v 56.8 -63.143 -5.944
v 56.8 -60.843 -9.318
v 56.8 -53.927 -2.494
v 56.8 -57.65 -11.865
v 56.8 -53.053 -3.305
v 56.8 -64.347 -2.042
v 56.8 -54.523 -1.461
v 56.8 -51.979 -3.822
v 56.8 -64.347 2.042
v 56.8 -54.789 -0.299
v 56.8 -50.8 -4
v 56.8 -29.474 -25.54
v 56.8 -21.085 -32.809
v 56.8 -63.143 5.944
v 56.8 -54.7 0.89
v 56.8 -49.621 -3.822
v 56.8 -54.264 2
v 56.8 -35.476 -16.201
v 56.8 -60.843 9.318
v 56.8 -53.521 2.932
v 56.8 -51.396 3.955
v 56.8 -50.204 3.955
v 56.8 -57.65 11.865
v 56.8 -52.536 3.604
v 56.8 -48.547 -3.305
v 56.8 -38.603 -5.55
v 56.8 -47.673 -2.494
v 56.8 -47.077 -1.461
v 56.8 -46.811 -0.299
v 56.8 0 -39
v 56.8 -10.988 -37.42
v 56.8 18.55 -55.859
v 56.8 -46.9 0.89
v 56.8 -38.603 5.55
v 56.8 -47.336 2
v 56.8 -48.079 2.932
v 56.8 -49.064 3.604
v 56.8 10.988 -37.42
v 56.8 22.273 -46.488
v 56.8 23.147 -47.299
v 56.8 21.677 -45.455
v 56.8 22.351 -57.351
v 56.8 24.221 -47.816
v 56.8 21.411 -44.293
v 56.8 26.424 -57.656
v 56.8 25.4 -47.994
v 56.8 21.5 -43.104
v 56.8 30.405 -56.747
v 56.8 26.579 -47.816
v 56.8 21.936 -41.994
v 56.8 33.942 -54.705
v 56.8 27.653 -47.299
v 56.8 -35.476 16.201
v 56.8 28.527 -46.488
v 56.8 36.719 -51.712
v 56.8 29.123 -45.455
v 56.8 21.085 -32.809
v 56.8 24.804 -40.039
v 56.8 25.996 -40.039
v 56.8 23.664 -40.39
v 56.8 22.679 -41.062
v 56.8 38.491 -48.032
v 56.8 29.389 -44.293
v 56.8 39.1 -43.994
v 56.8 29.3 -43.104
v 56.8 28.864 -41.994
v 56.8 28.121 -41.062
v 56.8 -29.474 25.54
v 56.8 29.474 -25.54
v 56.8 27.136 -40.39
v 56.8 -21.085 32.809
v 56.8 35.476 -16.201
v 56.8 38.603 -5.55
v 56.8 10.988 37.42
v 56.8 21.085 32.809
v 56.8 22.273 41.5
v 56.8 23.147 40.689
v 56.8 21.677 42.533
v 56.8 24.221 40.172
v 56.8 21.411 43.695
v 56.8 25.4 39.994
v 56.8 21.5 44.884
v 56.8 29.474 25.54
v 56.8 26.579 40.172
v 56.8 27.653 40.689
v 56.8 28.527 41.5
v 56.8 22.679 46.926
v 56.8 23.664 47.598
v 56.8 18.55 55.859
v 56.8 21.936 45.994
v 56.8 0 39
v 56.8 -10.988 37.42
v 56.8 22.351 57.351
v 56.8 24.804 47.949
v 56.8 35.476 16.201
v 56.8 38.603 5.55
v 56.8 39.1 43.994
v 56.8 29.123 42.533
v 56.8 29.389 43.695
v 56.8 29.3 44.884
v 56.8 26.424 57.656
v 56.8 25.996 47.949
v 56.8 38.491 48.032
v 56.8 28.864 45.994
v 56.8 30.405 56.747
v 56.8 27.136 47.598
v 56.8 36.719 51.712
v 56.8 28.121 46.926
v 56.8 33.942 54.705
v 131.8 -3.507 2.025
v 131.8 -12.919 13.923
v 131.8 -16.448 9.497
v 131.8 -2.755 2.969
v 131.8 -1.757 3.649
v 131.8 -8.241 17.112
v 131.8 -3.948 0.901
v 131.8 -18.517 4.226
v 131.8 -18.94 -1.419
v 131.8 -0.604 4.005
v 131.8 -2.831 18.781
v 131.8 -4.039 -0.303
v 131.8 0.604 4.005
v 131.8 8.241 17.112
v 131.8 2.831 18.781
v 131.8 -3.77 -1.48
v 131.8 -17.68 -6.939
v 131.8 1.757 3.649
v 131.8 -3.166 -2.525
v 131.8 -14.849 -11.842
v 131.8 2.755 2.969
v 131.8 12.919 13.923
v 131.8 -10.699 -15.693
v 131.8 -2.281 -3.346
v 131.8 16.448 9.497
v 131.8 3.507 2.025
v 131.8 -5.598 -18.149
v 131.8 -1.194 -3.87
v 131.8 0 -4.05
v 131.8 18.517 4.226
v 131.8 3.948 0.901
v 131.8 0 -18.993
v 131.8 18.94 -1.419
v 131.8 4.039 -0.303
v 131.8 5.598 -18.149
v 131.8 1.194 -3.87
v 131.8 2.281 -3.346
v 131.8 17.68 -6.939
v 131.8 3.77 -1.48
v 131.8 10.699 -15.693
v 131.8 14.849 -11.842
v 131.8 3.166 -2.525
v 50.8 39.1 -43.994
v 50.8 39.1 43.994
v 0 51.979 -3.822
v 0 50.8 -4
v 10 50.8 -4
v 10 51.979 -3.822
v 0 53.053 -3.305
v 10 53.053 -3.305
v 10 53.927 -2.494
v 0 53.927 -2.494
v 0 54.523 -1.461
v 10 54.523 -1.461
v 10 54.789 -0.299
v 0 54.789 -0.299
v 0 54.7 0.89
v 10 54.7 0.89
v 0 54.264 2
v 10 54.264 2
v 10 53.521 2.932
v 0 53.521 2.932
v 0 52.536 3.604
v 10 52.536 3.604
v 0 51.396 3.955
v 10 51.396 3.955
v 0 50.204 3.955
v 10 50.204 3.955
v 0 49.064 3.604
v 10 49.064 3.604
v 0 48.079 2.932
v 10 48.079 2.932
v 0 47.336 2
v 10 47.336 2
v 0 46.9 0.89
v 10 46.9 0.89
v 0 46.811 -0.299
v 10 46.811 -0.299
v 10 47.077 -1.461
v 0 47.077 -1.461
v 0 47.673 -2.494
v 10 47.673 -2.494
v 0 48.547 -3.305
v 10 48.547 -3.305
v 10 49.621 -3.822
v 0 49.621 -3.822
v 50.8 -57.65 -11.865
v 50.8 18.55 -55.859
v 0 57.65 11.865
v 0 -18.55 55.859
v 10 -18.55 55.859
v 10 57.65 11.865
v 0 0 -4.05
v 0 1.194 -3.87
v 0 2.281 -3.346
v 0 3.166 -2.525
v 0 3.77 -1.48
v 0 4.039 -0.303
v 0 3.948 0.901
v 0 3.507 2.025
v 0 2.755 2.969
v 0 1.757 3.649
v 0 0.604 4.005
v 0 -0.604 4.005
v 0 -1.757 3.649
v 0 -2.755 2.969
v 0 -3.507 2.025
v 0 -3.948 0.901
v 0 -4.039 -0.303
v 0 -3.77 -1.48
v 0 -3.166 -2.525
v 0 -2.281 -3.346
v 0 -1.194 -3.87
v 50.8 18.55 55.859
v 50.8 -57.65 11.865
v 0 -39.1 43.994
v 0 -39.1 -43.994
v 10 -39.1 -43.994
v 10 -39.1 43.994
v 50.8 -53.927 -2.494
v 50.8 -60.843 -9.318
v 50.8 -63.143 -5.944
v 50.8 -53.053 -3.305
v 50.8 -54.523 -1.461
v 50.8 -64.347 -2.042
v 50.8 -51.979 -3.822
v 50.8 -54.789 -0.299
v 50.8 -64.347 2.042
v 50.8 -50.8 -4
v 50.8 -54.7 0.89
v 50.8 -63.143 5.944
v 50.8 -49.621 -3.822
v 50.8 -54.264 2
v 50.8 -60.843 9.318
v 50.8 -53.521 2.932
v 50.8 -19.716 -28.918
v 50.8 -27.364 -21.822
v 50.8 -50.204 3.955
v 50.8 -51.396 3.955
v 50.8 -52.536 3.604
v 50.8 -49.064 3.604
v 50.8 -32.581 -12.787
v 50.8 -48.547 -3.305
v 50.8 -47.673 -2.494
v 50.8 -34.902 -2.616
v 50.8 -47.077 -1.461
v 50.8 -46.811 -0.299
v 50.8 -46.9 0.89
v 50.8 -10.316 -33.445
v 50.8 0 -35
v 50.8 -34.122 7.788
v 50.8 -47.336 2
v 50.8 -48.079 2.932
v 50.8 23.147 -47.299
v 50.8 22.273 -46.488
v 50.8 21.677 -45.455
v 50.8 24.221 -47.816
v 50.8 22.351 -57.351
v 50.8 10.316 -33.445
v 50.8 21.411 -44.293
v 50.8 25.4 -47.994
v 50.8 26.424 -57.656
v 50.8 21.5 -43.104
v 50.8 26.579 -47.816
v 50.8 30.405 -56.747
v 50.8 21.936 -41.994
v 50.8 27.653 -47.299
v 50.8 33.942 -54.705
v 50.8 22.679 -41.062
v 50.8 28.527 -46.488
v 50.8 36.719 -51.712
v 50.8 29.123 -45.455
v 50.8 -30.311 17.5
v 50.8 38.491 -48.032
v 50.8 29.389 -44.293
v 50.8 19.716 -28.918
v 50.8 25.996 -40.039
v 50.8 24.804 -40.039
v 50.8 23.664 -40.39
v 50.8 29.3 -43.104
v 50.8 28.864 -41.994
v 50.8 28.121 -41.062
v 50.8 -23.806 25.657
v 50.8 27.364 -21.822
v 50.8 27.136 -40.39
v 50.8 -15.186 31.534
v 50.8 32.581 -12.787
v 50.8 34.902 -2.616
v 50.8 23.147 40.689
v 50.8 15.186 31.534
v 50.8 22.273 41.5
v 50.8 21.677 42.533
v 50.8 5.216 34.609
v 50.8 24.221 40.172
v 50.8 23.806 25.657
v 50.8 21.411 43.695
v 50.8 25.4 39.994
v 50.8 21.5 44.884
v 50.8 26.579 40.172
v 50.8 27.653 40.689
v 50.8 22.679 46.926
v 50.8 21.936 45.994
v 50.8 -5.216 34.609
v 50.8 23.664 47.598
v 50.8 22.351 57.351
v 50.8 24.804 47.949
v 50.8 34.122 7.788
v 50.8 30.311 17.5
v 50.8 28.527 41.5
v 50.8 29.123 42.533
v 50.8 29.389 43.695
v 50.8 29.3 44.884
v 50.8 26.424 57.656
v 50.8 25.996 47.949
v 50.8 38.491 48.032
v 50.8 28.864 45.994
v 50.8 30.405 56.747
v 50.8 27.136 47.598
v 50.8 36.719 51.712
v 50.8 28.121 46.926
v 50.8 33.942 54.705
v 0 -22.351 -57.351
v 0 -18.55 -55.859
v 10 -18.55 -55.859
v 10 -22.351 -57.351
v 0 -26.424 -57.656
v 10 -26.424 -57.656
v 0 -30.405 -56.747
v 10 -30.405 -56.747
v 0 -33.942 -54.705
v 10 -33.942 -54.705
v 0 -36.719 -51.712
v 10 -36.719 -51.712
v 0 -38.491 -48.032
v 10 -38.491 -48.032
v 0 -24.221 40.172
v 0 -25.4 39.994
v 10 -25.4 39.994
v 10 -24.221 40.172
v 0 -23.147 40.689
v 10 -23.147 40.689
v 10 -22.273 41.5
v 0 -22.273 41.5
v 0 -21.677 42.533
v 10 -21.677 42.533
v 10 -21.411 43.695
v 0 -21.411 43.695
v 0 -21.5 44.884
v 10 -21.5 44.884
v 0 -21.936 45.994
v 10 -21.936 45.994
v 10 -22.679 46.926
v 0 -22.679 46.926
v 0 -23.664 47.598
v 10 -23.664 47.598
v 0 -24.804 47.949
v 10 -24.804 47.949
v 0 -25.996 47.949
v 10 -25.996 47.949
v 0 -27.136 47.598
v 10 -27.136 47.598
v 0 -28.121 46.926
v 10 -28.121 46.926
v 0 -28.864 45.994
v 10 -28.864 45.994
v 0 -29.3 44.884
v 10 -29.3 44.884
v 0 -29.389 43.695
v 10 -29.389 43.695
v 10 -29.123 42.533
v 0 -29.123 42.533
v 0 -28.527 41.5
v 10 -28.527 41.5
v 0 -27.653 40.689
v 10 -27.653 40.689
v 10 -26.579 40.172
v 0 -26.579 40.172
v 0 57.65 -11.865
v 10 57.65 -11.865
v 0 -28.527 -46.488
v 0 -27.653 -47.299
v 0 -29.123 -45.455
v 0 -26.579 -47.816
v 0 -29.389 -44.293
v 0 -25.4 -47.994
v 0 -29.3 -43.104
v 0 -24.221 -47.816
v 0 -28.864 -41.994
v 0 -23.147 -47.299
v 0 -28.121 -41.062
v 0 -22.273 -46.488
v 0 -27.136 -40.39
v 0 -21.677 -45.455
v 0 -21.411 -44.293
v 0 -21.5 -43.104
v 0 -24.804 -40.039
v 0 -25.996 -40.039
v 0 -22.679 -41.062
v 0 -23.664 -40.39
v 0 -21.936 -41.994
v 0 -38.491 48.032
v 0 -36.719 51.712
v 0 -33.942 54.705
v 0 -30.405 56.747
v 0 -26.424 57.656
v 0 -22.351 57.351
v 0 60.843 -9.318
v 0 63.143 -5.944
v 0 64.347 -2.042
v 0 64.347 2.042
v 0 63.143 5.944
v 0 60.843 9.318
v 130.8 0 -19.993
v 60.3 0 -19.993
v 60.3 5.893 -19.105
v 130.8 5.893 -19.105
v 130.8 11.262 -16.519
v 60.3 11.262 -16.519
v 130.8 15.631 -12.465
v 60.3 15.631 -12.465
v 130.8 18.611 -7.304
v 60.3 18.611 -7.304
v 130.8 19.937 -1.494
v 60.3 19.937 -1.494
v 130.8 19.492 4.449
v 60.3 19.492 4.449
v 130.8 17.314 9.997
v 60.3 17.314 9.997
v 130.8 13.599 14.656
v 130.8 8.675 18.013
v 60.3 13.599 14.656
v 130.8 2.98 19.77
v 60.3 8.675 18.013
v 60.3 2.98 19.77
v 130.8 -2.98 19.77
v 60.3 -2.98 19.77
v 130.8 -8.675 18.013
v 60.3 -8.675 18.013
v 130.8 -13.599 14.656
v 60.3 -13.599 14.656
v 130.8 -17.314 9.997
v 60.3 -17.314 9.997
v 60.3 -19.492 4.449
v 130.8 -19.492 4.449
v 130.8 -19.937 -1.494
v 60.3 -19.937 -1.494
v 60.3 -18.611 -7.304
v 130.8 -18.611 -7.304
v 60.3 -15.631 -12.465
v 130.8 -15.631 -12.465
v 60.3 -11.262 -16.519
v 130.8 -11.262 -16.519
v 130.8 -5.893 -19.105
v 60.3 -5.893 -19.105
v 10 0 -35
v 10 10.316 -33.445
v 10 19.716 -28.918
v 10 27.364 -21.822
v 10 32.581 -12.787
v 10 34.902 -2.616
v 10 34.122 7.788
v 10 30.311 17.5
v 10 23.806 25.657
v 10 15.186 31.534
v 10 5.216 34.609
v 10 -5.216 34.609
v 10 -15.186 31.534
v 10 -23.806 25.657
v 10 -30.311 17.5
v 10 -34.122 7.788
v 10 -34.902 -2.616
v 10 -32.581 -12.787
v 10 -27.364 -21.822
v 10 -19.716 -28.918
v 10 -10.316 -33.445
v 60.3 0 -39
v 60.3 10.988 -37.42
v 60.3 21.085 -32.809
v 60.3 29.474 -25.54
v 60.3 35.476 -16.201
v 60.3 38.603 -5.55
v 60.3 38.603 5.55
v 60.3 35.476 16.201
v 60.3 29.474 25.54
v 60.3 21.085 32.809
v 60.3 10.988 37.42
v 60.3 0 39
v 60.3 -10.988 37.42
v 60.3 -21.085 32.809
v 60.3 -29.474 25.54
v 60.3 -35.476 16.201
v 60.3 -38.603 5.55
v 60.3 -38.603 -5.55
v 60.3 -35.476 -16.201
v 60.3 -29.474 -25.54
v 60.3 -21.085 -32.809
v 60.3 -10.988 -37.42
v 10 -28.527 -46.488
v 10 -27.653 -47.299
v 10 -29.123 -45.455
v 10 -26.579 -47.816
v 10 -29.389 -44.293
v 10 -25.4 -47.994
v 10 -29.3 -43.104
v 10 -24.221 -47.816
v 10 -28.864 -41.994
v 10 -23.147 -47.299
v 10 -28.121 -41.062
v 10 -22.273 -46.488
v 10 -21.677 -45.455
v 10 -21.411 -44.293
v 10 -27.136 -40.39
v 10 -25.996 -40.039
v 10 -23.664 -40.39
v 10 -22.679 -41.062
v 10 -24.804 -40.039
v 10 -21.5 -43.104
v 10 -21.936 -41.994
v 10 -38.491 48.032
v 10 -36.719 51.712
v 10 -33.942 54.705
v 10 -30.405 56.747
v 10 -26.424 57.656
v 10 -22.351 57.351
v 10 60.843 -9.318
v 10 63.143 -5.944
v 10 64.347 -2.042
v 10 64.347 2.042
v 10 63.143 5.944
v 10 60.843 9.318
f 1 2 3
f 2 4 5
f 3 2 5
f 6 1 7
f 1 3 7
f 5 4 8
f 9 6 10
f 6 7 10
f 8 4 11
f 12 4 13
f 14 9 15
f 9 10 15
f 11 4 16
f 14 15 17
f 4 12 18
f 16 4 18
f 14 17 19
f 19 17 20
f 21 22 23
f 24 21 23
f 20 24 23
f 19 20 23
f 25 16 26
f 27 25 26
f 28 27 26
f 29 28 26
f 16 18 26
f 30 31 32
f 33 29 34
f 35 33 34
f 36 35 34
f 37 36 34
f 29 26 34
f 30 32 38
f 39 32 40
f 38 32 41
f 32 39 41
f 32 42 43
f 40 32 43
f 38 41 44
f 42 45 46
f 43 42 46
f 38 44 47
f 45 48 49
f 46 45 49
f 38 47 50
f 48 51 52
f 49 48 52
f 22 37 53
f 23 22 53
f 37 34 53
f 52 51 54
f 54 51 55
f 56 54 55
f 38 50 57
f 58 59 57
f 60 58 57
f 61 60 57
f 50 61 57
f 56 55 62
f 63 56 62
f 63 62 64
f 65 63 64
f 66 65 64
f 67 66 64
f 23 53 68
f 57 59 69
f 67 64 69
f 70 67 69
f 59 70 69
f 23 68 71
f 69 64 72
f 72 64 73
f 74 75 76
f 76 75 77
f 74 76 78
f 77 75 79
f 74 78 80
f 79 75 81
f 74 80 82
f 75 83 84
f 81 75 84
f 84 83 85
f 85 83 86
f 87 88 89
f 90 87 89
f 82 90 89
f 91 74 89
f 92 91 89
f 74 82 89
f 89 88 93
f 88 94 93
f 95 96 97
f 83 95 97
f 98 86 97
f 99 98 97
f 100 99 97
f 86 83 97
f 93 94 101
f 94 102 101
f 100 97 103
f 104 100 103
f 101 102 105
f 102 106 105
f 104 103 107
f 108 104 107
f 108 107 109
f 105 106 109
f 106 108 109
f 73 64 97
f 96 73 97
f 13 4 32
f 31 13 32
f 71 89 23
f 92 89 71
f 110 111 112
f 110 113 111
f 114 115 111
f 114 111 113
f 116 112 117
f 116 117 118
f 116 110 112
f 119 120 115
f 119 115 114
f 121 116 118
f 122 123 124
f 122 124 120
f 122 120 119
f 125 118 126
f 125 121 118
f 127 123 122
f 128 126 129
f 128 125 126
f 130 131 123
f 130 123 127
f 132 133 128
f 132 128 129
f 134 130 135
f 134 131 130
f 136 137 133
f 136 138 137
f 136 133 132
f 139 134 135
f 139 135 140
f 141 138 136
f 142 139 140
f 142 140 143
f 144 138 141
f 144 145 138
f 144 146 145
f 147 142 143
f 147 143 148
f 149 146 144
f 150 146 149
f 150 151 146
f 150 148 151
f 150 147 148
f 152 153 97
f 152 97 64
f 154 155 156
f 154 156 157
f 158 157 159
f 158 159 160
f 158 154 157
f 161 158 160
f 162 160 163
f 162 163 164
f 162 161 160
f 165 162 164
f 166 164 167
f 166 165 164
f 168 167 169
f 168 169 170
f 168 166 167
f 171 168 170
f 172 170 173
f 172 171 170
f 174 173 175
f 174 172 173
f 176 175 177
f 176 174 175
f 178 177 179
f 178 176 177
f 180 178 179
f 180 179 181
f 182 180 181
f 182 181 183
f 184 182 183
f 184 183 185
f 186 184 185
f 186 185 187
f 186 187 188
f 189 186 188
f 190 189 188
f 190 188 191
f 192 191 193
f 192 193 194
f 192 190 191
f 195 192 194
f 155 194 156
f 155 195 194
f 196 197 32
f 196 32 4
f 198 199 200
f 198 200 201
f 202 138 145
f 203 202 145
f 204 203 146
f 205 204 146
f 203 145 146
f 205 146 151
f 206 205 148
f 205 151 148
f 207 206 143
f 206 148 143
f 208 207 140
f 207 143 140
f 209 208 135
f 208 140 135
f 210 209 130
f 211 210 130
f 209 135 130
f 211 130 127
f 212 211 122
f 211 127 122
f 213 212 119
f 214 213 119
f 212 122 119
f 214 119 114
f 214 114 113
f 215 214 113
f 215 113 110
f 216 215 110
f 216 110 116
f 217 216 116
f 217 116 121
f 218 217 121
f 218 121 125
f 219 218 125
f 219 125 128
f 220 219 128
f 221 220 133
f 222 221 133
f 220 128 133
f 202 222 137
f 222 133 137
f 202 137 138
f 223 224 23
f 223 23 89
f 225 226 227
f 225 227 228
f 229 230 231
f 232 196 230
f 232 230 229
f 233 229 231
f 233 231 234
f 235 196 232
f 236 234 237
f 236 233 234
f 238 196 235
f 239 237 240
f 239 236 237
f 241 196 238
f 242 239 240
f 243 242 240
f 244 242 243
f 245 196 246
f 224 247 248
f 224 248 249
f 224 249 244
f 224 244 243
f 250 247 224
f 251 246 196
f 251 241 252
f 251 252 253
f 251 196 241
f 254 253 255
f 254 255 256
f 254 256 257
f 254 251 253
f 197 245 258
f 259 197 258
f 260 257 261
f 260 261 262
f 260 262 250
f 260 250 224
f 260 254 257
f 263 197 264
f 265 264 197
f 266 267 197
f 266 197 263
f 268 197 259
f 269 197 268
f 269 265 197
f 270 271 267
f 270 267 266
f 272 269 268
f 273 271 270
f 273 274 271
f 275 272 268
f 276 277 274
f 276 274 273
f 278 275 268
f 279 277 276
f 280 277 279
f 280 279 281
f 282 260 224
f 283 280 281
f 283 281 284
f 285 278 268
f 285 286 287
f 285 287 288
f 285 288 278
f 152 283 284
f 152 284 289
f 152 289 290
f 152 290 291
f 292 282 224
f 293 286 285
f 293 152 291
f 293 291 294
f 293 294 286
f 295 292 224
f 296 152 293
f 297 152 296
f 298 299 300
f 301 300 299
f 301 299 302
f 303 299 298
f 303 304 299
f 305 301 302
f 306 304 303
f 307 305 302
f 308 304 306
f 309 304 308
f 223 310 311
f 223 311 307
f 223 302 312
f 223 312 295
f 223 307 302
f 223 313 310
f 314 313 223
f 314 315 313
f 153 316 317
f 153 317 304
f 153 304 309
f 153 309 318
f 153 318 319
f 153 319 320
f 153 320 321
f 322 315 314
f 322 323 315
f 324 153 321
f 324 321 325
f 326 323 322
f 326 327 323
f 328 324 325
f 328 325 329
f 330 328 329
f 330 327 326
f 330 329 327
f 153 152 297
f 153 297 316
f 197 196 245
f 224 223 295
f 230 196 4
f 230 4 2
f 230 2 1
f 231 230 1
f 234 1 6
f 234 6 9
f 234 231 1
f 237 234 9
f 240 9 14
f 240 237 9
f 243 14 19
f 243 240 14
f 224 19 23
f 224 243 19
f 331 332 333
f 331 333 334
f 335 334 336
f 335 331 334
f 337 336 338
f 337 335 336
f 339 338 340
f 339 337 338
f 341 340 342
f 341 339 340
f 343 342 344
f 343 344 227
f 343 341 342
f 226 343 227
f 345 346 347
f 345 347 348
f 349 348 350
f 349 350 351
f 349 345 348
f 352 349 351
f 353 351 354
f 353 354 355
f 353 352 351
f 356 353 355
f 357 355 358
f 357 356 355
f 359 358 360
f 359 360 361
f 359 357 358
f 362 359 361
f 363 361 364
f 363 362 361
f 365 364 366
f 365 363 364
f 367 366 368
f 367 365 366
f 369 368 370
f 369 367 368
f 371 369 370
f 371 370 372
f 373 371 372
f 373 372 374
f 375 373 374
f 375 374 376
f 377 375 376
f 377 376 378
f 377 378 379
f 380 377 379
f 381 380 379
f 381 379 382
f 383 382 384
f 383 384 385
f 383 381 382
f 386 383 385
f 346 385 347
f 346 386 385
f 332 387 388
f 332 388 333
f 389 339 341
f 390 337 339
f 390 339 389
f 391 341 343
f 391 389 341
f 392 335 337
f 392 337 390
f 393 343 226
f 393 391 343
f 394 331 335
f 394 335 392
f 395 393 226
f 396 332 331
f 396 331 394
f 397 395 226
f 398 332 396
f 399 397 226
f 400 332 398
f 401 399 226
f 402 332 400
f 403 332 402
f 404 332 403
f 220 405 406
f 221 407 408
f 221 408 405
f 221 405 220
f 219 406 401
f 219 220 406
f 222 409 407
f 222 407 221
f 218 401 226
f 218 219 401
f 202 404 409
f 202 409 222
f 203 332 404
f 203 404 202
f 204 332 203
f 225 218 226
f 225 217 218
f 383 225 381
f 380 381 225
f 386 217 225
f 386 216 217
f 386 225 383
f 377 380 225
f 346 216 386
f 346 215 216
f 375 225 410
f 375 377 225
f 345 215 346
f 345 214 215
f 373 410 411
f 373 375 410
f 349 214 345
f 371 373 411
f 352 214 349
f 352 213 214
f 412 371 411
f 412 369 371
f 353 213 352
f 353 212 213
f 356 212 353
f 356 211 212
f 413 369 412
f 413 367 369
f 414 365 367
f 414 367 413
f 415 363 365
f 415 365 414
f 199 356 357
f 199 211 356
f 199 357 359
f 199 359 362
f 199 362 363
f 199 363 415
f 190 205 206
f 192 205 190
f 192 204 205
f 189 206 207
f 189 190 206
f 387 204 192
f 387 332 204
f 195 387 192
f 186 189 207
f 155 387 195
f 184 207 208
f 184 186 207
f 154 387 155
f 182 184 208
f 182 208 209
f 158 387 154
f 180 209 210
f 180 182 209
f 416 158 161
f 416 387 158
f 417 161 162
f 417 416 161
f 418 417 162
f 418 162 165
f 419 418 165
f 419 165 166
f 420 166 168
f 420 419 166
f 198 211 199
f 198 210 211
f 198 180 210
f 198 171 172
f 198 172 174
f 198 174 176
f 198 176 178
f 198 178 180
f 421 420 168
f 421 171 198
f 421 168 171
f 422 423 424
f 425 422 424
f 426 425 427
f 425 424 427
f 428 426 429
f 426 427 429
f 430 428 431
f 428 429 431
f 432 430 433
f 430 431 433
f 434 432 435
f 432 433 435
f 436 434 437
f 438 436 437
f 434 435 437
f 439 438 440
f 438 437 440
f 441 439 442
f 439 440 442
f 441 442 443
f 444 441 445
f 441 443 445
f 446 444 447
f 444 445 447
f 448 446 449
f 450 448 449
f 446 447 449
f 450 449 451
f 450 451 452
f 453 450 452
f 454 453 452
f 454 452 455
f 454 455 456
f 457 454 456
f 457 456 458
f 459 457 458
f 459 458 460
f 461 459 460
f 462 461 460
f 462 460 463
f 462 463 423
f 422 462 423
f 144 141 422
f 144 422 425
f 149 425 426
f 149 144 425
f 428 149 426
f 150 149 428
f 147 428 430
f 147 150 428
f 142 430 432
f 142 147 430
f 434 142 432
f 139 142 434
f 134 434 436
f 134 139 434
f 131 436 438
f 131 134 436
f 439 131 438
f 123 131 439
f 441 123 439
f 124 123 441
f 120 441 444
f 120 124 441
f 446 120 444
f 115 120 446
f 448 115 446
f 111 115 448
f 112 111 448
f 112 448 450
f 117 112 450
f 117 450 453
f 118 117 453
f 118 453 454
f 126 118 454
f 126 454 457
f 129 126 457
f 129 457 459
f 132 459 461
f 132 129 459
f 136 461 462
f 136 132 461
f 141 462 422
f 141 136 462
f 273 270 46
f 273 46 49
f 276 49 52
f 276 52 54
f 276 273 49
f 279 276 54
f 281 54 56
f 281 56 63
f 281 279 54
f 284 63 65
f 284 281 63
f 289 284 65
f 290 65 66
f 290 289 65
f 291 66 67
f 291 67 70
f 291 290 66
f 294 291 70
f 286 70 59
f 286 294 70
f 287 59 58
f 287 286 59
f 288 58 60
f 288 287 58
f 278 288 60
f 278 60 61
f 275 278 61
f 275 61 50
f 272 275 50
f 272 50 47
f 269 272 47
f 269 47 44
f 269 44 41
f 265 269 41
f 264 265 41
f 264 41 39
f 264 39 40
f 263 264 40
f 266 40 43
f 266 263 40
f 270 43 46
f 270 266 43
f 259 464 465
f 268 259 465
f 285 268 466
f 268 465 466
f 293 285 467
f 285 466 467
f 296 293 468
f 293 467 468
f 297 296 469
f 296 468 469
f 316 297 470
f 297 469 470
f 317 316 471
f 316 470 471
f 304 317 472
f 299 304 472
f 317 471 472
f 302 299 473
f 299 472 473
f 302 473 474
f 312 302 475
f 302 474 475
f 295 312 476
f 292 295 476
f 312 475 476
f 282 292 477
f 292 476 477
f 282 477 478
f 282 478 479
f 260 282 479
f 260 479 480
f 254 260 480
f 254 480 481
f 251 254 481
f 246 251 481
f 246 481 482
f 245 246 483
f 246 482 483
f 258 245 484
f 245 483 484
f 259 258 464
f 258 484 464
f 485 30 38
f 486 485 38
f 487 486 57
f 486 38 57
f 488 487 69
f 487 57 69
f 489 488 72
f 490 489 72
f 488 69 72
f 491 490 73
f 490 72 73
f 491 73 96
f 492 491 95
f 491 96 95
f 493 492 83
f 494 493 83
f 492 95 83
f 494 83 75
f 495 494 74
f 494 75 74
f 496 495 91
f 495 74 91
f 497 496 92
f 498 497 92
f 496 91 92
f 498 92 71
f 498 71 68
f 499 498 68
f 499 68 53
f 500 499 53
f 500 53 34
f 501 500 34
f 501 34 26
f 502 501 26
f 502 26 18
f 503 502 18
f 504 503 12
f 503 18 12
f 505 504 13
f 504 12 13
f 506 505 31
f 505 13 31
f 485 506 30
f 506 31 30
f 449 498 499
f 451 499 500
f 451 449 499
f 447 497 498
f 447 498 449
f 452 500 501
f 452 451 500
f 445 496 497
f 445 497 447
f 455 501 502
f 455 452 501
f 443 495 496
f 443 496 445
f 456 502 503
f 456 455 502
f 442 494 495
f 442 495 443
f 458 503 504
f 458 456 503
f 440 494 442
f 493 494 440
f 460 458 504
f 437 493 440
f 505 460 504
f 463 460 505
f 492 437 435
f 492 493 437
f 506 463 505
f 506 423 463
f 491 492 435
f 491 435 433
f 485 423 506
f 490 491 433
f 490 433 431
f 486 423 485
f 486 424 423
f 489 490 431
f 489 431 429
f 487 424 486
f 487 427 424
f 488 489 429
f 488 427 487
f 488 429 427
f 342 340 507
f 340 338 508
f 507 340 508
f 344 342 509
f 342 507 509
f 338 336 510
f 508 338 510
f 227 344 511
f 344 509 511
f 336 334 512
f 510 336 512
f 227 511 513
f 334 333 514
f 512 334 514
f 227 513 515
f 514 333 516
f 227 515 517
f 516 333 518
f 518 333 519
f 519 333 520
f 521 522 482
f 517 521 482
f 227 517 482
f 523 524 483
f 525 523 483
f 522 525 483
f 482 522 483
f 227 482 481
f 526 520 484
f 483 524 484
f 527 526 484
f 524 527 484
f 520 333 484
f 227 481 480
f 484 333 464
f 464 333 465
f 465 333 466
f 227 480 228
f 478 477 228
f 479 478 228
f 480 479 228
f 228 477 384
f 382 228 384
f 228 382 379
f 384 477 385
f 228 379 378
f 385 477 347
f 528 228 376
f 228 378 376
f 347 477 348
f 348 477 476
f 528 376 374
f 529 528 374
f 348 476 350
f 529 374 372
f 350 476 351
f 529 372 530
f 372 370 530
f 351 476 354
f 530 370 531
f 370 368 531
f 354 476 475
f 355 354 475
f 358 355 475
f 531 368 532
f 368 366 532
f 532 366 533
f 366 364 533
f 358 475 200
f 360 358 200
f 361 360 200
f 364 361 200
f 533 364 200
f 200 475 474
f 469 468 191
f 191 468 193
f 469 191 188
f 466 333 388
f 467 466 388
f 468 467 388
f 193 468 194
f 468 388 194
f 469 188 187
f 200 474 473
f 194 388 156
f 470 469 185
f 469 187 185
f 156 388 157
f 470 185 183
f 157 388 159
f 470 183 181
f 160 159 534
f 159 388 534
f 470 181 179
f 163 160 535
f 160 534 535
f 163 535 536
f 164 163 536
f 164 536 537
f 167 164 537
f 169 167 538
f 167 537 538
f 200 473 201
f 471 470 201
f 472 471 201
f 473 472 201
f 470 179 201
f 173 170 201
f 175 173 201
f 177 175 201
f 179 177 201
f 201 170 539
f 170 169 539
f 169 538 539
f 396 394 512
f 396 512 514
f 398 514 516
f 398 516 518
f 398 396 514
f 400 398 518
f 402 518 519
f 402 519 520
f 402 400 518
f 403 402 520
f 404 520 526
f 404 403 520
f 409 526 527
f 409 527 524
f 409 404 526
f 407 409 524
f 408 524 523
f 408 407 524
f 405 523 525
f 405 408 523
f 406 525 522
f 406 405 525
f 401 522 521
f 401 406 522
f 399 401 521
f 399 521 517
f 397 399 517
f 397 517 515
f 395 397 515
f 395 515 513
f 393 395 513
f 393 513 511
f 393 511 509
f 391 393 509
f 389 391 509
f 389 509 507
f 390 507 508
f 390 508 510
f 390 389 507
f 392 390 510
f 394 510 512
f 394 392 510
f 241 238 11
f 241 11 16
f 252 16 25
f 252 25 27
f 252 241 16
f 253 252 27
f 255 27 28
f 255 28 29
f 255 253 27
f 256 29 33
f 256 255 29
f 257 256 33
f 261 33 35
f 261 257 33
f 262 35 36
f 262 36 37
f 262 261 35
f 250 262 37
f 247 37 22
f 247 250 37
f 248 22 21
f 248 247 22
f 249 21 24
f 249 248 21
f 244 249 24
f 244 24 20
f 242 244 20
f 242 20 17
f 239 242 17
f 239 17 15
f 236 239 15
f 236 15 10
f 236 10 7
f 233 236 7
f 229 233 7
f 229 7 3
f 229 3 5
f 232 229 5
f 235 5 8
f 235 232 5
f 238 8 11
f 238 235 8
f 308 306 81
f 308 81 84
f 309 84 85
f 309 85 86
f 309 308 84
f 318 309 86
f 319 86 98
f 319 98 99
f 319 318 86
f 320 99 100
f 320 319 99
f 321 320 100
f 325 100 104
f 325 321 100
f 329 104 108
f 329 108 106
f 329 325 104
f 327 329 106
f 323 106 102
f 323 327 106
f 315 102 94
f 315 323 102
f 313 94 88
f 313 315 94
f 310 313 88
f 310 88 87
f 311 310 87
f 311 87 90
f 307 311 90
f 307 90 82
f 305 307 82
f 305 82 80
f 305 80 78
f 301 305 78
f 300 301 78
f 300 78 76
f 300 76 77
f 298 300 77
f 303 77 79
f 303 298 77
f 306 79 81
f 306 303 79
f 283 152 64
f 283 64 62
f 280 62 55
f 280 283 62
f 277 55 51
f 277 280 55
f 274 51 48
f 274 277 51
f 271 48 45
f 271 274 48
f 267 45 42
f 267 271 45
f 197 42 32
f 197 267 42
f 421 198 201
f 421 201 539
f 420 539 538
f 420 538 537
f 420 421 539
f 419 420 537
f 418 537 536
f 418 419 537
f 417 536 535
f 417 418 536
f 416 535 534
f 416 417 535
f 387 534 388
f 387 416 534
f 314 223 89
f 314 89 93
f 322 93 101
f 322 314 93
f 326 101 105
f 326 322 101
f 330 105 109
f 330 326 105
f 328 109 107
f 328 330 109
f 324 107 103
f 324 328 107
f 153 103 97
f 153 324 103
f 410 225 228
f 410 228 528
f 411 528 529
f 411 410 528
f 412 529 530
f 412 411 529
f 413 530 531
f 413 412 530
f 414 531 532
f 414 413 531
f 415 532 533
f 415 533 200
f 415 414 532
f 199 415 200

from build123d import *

# Parameters (mm, degrees)
SKETCH10_R           = 4
BOSS_EXTRUDE12_DEPTH = 10
SKETCH11_R           = 35
BOSS_EXTRUDE13_DEPTH = 40.8
SKETCH12_R           = 4
BOSS_EXTRUDE14_DEPTH = 6
SKETCH13_R           = 19.993
BOSS_EXTRUDE15_DEPTH = 75
SKETCH16_R           = 39
BOSS_EXTRUDE16_DEPTH = 3.5
CHAMFER1_SIZE        = 1
SKETCH17_R           = 4.05
CUT_EXTRUDE1_DEPTH   = 131.8


with BuildPart() as part:
    # Sketch10 → Boss-Extrude12 (new body)
    with BuildSketch(Plane(origin=(0, 0, 0), x_dir=(0, 0, -1), z_dir=(1, 0, 0))):
        with BuildLine():
            Line((-55.858638544, -18.55), (-11.864548032, 57.65))
            ThreePointArc((-11.864548032, 57.65), (0, 64.5), (11.864548032, 57.65))
            Line((11.864548032, 57.65), (55.858638544, -18.55))
            ThreePointArc((55.858638544, -18.55), (55.858638544, -32.25), (43.994090512, -39.1))
            Line((43.994090512, -39.1), (-43.994090512, -39.1))
            ThreePointArc((-43.994090512, -39.1), (-55.858638544, -32.25), (-55.858638544, -18.55))
        make_face()
        with Locations((0, 50.8)):
            Circle(SKETCH10_R, mode=Mode.SUBTRACT)
        with Locations((43.994090512, -25.4)):
            Circle(SKETCH10_R, mode=Mode.SUBTRACT)
        with Locations((-43.994090512, -25.4)):
            Circle(SKETCH10_R, mode=Mode.SUBTRACT)
    extrude(amount=BOSS_EXTRUDE12_DEPTH)

    # Sketch11 → Boss-Extrude13 (add)
    with BuildSketch(Plane(origin=(10, 0, 0), x_dir=(0, 0, -1), z_dir=(1, 0, 0))):
        Circle(SKETCH11_R)
    extrude(amount=BOSS_EXTRUDE13_DEPTH)

    # Sketch12 → Boss-Extrude14 (add)
    with BuildSketch(Plane(origin=(50.8, 0, 0), x_dir=(0, 0, -1), z_dir=(1, 0, 0))):
        with BuildLine():
            Line((-43.994090512, 39.1), (43.994090512, 39.1))
            ThreePointArc((43.994090512, 39.1), (55.858638544, 32.25), (55.858638544, 18.55))
            Line((55.858638544, 18.55), (11.864548032, -57.65))
            ThreePointArc((11.864548032, -57.65), (0, -64.5), (-11.864548032, -57.65))
            Line((-11.864548032, -57.65), (-55.858638544, 18.55))
            ThreePointArc((-55.858638544, 18.55), (-55.858638544, 32.25), (-43.994090512, 39.1))
        make_face()
        with Locations((43.994090512, 25.4)):
            Circle(SKETCH12_R, mode=Mode.SUBTRACT)
        with Locations((0, -50.8)):
            Circle(SKETCH12_R, mode=Mode.SUBTRACT)
        with Locations((-43.994090512, 25.4)):
            Circle(SKETCH12_R, mode=Mode.SUBTRACT)
    extrude(amount=BOSS_EXTRUDE14_DEPTH)

    # Sketch13 → Boss-Extrude15 (add)
    with BuildSketch(Plane(origin=(56.8, 0, 0), x_dir=(0, 0, -1), z_dir=(1, 0, 0))):
        Circle(SKETCH13_R)
    extrude(amount=BOSS_EXTRUDE15_DEPTH)

    # Sketch16 → Boss-Extrude16 (add)
    with BuildSketch(Plane(origin=(56.8, 0, 0), x_dir=(0, 0, -1), z_dir=(1, 0, 0))):
        Circle(SKETCH16_R)
    extrude(amount=BOSS_EXTRUDE16_DEPTH)

    # Chamfer1
    chamfer1_edges = [part.edges().sort_by_distance(p)[0] for p in [
        (131.8, 0, 19.993),
    ]]
    chamfer(chamfer1_edges, length=CHAMFER1_SIZE)

    # Sketch17 → Cut-Extrude1 (cut)
    with BuildSketch(Plane(origin=(131.8, 0, 0), x_dir=(0, 0, -1), z_dir=(1, 0, 0))):
        Circle(SKETCH17_R)
    extrude(amount=-CUT_EXTRUDE1_DEPTH, mode=Mode.SUBTRACT)


solid = part.part
